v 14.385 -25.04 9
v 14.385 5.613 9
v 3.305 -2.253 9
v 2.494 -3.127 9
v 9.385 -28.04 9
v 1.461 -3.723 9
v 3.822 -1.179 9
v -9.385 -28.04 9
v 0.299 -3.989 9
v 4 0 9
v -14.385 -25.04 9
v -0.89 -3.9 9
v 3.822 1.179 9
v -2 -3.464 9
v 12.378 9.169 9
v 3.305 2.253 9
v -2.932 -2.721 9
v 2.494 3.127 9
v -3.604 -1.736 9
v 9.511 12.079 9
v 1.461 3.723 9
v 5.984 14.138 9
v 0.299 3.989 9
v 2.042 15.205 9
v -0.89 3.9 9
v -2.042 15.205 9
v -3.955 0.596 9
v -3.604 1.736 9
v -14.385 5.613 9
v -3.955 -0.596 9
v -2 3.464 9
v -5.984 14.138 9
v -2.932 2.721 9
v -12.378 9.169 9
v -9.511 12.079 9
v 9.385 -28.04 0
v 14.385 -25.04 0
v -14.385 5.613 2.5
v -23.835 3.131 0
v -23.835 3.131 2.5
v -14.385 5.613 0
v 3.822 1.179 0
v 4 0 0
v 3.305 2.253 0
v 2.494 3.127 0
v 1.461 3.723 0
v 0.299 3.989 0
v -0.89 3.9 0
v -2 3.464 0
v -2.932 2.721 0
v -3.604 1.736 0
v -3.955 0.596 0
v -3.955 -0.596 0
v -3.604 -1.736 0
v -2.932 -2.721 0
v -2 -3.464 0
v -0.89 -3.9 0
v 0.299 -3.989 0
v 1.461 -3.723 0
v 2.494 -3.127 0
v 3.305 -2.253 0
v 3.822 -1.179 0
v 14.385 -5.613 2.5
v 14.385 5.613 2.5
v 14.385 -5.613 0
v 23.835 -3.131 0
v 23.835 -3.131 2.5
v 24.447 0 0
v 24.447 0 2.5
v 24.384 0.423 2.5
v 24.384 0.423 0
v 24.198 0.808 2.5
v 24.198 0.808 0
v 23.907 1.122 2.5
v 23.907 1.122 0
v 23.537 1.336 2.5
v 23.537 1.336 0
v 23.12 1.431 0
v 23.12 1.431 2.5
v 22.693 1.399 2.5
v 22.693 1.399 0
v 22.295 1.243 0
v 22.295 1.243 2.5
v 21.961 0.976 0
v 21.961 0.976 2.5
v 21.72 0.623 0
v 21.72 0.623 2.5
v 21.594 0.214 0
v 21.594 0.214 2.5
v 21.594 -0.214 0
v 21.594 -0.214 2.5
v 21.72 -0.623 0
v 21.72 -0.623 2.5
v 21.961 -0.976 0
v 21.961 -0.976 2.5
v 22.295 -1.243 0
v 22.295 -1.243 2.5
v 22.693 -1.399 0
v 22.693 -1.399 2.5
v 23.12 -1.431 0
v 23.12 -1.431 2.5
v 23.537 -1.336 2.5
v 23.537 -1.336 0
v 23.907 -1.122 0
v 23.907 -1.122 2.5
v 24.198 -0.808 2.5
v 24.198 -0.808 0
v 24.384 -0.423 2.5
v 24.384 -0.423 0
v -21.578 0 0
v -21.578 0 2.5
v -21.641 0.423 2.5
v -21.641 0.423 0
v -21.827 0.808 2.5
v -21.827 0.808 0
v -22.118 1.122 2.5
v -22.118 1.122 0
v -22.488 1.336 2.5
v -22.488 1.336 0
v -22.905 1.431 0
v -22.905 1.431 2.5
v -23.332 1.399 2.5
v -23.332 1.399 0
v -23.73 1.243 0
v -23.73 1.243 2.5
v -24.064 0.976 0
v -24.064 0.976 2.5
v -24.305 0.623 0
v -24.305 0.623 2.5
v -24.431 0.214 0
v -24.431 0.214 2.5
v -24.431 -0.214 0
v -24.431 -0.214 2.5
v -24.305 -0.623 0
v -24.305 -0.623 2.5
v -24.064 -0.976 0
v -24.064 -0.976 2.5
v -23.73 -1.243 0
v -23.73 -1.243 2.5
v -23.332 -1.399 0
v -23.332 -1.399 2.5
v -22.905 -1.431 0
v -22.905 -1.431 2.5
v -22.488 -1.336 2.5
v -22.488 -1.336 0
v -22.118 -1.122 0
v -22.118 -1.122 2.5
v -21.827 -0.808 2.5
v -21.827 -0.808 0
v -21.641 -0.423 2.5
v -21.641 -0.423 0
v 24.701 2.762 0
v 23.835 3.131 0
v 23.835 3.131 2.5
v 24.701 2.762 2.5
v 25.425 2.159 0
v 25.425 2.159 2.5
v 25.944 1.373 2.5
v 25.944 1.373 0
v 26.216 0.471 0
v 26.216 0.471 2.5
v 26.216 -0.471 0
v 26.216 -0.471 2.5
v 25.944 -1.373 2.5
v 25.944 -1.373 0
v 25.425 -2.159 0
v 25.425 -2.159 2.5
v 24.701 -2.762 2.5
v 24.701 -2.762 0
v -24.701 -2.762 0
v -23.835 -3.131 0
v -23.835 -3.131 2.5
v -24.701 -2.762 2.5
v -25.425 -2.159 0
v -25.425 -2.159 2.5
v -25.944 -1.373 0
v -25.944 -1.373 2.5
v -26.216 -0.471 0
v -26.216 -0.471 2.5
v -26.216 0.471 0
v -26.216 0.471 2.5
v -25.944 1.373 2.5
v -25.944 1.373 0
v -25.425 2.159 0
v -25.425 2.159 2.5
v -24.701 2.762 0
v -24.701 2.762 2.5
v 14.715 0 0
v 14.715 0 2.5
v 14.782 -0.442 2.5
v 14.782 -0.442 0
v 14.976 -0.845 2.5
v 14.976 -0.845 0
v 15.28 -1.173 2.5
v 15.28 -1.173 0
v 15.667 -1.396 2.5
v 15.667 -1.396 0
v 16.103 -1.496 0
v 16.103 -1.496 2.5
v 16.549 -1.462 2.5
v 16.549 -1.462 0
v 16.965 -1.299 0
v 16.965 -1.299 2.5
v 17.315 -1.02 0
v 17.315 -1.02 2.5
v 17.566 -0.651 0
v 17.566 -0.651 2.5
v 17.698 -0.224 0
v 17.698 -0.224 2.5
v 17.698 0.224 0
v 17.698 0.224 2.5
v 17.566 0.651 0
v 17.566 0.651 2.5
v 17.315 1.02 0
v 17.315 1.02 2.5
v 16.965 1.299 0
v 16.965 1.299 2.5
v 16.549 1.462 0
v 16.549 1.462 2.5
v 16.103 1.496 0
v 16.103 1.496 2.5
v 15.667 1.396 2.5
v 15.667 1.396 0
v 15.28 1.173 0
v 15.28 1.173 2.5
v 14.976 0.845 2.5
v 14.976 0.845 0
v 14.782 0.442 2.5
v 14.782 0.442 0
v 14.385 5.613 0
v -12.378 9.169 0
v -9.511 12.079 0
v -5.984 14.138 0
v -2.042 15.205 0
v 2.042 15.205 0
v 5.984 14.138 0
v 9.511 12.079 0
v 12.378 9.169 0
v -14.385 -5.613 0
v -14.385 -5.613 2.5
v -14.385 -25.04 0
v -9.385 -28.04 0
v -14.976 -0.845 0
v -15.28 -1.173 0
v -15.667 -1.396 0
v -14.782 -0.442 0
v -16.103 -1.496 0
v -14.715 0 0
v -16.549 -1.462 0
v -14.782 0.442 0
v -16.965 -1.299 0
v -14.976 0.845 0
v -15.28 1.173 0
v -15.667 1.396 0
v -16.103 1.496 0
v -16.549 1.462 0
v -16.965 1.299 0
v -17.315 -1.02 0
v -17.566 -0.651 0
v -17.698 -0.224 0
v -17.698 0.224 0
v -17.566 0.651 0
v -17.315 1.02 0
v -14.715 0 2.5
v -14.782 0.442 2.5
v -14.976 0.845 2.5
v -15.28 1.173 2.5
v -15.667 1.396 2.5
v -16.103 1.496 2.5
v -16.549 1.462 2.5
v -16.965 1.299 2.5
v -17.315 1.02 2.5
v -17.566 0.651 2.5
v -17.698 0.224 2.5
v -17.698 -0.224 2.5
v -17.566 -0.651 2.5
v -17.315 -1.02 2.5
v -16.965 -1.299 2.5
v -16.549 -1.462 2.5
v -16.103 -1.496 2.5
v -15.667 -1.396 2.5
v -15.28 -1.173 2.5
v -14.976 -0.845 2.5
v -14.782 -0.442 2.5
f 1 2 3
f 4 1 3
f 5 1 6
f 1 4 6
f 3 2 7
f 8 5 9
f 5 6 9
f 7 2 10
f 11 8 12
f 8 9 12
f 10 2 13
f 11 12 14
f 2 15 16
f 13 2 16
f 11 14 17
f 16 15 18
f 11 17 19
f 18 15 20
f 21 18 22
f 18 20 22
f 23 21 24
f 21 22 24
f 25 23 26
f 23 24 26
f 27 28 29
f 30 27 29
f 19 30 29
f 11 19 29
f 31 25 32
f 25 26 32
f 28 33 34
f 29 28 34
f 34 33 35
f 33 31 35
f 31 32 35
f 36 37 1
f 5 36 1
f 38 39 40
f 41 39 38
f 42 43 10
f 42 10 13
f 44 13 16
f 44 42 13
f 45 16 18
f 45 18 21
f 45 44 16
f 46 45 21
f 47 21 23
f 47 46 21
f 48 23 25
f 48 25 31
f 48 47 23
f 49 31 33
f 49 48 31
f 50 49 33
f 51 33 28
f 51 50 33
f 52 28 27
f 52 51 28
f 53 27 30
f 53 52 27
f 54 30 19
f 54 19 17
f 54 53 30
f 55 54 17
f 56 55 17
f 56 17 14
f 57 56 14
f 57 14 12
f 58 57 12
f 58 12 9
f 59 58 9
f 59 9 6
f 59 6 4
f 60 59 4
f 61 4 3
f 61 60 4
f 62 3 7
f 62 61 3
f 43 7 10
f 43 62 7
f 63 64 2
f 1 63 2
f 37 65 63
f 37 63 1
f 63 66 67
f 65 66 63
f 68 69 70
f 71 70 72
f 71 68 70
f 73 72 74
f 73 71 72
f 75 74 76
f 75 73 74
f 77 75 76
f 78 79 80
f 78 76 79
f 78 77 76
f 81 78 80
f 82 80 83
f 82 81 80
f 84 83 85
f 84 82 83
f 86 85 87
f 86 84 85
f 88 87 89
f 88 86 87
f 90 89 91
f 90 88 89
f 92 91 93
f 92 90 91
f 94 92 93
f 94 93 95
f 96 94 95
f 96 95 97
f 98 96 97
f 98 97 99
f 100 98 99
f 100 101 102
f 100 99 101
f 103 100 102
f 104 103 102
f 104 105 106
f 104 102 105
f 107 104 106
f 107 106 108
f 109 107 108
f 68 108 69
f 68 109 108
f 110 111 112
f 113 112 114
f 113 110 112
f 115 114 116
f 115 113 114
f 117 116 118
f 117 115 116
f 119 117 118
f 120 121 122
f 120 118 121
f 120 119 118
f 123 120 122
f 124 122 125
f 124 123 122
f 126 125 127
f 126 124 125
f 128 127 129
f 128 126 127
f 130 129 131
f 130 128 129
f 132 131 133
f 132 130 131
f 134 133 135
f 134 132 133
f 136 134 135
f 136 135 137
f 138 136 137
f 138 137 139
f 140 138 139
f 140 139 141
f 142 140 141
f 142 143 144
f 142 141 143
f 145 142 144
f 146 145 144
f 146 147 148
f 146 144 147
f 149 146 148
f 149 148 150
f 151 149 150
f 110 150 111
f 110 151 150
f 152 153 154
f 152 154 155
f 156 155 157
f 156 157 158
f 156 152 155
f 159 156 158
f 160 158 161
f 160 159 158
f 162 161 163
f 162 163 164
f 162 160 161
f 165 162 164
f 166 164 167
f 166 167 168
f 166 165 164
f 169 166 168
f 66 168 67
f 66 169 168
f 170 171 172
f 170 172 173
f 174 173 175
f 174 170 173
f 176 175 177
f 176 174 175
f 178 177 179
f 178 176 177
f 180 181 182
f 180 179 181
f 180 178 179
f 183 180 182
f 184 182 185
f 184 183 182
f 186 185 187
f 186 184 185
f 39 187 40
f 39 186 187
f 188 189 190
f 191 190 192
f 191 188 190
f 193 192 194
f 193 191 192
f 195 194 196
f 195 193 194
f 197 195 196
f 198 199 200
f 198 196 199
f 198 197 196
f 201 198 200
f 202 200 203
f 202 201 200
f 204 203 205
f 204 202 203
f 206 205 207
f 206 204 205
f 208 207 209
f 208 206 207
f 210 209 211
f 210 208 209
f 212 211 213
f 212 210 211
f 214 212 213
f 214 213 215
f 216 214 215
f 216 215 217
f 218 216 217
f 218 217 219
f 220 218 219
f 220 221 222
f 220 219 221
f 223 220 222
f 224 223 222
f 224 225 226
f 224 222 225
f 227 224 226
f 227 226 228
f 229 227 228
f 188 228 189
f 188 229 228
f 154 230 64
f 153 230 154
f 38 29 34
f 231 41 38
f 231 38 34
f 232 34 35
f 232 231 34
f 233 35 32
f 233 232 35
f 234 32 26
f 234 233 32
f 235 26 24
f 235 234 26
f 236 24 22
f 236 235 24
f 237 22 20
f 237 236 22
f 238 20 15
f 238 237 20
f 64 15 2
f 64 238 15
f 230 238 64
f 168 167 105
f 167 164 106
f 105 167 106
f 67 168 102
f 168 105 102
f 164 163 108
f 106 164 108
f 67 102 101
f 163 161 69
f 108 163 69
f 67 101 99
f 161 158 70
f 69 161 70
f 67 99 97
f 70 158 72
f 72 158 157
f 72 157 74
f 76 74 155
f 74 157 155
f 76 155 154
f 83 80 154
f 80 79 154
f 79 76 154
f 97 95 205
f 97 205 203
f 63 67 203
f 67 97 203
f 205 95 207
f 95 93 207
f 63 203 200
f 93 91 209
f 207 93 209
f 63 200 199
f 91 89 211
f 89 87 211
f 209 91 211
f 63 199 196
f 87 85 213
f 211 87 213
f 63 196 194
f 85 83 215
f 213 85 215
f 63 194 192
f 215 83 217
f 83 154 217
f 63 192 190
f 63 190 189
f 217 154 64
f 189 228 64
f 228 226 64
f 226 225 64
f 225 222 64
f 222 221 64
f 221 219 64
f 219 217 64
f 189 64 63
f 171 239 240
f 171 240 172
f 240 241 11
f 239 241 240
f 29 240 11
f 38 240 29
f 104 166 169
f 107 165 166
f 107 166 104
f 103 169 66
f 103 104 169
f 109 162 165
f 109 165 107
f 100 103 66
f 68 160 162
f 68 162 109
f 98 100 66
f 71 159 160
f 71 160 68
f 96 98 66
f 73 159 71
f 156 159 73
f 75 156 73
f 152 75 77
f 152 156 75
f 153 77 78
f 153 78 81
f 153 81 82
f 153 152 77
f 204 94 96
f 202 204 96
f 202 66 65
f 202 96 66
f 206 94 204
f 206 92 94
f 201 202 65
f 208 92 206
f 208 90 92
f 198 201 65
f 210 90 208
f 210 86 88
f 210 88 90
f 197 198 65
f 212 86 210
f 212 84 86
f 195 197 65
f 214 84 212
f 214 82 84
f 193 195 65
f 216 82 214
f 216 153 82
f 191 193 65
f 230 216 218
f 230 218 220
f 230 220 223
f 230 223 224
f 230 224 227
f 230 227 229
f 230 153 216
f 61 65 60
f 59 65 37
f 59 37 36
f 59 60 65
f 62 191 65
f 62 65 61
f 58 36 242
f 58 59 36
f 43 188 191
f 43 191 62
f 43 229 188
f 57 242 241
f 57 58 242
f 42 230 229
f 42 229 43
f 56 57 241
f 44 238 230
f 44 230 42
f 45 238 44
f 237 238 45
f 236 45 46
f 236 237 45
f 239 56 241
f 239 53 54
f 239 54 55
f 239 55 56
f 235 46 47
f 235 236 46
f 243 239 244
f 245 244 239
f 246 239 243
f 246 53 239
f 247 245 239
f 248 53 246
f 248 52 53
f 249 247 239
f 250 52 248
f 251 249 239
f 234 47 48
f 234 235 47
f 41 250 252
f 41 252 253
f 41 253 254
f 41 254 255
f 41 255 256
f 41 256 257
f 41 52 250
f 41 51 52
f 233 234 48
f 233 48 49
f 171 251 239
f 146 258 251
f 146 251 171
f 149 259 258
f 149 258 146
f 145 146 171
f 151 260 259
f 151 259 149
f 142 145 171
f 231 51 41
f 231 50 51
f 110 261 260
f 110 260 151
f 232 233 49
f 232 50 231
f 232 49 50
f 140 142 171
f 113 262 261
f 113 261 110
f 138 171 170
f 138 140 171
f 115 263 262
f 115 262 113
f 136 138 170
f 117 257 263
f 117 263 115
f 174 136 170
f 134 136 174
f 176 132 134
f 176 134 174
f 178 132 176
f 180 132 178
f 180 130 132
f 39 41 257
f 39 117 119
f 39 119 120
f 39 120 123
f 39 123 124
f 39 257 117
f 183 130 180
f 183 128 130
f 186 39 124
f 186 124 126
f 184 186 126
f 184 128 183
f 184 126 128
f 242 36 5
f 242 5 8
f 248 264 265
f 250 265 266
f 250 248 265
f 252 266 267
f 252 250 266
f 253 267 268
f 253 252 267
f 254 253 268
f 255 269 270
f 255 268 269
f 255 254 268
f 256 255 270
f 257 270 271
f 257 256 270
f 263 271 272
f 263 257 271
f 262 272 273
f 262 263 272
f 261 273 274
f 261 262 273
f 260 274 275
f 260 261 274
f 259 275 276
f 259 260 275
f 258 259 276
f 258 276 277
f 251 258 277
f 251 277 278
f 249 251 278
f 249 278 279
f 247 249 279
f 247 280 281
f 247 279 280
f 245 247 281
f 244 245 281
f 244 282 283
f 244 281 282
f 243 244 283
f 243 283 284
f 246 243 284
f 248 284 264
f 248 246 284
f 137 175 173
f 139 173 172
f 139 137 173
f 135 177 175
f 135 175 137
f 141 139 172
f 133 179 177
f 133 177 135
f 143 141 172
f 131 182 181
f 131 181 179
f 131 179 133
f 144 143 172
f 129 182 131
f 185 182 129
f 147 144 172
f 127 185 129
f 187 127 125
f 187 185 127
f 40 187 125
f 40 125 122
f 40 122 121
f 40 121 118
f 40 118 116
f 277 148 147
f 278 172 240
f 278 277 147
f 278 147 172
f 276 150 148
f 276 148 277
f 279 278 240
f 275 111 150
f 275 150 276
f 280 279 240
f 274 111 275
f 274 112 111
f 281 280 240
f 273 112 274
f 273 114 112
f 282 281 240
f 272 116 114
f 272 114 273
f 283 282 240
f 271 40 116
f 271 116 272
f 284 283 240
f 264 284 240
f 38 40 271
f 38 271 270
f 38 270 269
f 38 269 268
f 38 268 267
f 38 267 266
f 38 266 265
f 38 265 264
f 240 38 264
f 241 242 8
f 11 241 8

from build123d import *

# Parameters (mm, degrees)
SKETCH_1_R          = 4
SKETCH_1_R_2        = 1.435
SKETCH_1_R_3        = 1.5
EXTRUDE_1_DEPTH     = 9
CUT_EXTRUDE_START   = -6.5
CUT_EXTRUDE_1_DEPTH = 6.5
CHAMFER_1_SIZE      = 5
CHAMFER_1_SIZE2     = 3
CHAMFER_2_SIZE      = 3
CHAMFER_2_SIZE2     = 5


with BuildPart() as part:
    # ｽｹｯﾁ1 → ﾎﾞｽ - 押し出し1 (new body)
    with BuildSketch(Plane.XY):
        with BuildLine():
            Line((14.385, -28.04), (-14.385, -28.04))
            Line((-14.385, -28.04), (-14.385, -5.612501624))
            Line((-14.385, -5.612501624), (-23.834680852, -3.131361508))
            ThreePointArc((-23.834680852, -3.131361508), (-26.25, 0), (-23.834680852, 3.131361508))
            Line((-23.834680852, 3.131361508), (-14.385, 5.612501624))
            ThreePointArc((-14.385, 5.612501624), (0, 15.34), (14.385, 5.612501624))
            Line((14.385, 5.612501624), (23.834680852, 3.131361508))
            ThreePointArc((23.834680852, 3.131361508), (26.25, 0), (23.834680852, -3.131361508))
            Line((23.834680852, -3.131361508), (14.385, -5.612501624))
            Line((14.385, -5.612501624), (14.385, -28.04))
        make_face()
        Circle(SKETCH_1_R, mode=Mode.SUBTRACT)
        with Locations((-23.0125, 0)):
            Circle(SKETCH_1_R_2, mode=Mode.SUBTRACT)
        with Locations((23.0125, 0)):
            Circle(SKETCH_1_R_2, mode=Mode.SUBTRACT)
        with Locations((-16.215, 0)):
            Circle(SKETCH_1_R_3, mode=Mode.SUBTRACT)
        with Locations(Location((16.215, 0, 0), (0, 0, 180))):
            Circle(SKETCH_1_R_3, mode=Mode.SUBTRACT)
    extrude(amount=EXTRUDE_1_DEPTH)

    # ｽｹｯﾁ2 → ｶｯﾄ - 押し出し1 (cut)
    with BuildSketch(Plane.XY.offset(9).offset(CUT_EXTRUDE_START)):
        with BuildLine():
            Line((-14.385, 5.612501624), (-23.834680852, 3.131361508))
            ThreePointArc((-23.834680852, 3.131361508), (-26.25, 0), (-23.834680852, -3.131361508))
            Line((-23.834680852, -3.131361508), (-14.385, -5.612501624))
            Line((-14.385, -5.612501624), (-14.385, 5.612501624))
        make_face()
        with BuildLine():
            Line((14.385, -5.612501624), (14.385, 5.612501624))
            Line((14.385, 5.612501624), (23.834680852, 3.131361508))
            ThreePointArc((23.834680852, 3.131361508), (26.25, 0), (23.834680852, -3.131361508))
            Line((23.834680852, -3.131361508), (14.385, -5.612501624))
        make_face()
    extrude(amount=CUT_EXTRUDE_1_DEPTH, mode=Mode.SUBTRACT)

    # 面取り1
    chamfer_1_edges = [part.edges().sort_by_distance(p)[0] for p in [
        (14.385, -28.04, 4.5),
    ]]
    chamfer_1_side = [part.faces().sort_by_distance(p)[0] for p in [
        (0, -28.04, 4.5),
    ]]
    chamfer(chamfer_1_edges, length=CHAMFER_1_SIZE, length2=CHAMFER_1_SIZE2, reference=chamfer_1_side[0])

    # 面取り2
    chamfer_2_edges = [part.edges().sort_by_distance(p)[0] for p in [
        (-14.385, -28.04, 4.5),
    ]]
    chamfer_2_side = [part.faces().sort_by_distance(p)[0] for p in [
        (-14.385, -12.358852788, 4.831877112),
    ]]
    chamfer(chamfer_2_edges, length=CHAMFER_2_SIZE, length2=CHAMFER_2_SIZE2, reference=chamfer_2_side[0])


solid = part.part
